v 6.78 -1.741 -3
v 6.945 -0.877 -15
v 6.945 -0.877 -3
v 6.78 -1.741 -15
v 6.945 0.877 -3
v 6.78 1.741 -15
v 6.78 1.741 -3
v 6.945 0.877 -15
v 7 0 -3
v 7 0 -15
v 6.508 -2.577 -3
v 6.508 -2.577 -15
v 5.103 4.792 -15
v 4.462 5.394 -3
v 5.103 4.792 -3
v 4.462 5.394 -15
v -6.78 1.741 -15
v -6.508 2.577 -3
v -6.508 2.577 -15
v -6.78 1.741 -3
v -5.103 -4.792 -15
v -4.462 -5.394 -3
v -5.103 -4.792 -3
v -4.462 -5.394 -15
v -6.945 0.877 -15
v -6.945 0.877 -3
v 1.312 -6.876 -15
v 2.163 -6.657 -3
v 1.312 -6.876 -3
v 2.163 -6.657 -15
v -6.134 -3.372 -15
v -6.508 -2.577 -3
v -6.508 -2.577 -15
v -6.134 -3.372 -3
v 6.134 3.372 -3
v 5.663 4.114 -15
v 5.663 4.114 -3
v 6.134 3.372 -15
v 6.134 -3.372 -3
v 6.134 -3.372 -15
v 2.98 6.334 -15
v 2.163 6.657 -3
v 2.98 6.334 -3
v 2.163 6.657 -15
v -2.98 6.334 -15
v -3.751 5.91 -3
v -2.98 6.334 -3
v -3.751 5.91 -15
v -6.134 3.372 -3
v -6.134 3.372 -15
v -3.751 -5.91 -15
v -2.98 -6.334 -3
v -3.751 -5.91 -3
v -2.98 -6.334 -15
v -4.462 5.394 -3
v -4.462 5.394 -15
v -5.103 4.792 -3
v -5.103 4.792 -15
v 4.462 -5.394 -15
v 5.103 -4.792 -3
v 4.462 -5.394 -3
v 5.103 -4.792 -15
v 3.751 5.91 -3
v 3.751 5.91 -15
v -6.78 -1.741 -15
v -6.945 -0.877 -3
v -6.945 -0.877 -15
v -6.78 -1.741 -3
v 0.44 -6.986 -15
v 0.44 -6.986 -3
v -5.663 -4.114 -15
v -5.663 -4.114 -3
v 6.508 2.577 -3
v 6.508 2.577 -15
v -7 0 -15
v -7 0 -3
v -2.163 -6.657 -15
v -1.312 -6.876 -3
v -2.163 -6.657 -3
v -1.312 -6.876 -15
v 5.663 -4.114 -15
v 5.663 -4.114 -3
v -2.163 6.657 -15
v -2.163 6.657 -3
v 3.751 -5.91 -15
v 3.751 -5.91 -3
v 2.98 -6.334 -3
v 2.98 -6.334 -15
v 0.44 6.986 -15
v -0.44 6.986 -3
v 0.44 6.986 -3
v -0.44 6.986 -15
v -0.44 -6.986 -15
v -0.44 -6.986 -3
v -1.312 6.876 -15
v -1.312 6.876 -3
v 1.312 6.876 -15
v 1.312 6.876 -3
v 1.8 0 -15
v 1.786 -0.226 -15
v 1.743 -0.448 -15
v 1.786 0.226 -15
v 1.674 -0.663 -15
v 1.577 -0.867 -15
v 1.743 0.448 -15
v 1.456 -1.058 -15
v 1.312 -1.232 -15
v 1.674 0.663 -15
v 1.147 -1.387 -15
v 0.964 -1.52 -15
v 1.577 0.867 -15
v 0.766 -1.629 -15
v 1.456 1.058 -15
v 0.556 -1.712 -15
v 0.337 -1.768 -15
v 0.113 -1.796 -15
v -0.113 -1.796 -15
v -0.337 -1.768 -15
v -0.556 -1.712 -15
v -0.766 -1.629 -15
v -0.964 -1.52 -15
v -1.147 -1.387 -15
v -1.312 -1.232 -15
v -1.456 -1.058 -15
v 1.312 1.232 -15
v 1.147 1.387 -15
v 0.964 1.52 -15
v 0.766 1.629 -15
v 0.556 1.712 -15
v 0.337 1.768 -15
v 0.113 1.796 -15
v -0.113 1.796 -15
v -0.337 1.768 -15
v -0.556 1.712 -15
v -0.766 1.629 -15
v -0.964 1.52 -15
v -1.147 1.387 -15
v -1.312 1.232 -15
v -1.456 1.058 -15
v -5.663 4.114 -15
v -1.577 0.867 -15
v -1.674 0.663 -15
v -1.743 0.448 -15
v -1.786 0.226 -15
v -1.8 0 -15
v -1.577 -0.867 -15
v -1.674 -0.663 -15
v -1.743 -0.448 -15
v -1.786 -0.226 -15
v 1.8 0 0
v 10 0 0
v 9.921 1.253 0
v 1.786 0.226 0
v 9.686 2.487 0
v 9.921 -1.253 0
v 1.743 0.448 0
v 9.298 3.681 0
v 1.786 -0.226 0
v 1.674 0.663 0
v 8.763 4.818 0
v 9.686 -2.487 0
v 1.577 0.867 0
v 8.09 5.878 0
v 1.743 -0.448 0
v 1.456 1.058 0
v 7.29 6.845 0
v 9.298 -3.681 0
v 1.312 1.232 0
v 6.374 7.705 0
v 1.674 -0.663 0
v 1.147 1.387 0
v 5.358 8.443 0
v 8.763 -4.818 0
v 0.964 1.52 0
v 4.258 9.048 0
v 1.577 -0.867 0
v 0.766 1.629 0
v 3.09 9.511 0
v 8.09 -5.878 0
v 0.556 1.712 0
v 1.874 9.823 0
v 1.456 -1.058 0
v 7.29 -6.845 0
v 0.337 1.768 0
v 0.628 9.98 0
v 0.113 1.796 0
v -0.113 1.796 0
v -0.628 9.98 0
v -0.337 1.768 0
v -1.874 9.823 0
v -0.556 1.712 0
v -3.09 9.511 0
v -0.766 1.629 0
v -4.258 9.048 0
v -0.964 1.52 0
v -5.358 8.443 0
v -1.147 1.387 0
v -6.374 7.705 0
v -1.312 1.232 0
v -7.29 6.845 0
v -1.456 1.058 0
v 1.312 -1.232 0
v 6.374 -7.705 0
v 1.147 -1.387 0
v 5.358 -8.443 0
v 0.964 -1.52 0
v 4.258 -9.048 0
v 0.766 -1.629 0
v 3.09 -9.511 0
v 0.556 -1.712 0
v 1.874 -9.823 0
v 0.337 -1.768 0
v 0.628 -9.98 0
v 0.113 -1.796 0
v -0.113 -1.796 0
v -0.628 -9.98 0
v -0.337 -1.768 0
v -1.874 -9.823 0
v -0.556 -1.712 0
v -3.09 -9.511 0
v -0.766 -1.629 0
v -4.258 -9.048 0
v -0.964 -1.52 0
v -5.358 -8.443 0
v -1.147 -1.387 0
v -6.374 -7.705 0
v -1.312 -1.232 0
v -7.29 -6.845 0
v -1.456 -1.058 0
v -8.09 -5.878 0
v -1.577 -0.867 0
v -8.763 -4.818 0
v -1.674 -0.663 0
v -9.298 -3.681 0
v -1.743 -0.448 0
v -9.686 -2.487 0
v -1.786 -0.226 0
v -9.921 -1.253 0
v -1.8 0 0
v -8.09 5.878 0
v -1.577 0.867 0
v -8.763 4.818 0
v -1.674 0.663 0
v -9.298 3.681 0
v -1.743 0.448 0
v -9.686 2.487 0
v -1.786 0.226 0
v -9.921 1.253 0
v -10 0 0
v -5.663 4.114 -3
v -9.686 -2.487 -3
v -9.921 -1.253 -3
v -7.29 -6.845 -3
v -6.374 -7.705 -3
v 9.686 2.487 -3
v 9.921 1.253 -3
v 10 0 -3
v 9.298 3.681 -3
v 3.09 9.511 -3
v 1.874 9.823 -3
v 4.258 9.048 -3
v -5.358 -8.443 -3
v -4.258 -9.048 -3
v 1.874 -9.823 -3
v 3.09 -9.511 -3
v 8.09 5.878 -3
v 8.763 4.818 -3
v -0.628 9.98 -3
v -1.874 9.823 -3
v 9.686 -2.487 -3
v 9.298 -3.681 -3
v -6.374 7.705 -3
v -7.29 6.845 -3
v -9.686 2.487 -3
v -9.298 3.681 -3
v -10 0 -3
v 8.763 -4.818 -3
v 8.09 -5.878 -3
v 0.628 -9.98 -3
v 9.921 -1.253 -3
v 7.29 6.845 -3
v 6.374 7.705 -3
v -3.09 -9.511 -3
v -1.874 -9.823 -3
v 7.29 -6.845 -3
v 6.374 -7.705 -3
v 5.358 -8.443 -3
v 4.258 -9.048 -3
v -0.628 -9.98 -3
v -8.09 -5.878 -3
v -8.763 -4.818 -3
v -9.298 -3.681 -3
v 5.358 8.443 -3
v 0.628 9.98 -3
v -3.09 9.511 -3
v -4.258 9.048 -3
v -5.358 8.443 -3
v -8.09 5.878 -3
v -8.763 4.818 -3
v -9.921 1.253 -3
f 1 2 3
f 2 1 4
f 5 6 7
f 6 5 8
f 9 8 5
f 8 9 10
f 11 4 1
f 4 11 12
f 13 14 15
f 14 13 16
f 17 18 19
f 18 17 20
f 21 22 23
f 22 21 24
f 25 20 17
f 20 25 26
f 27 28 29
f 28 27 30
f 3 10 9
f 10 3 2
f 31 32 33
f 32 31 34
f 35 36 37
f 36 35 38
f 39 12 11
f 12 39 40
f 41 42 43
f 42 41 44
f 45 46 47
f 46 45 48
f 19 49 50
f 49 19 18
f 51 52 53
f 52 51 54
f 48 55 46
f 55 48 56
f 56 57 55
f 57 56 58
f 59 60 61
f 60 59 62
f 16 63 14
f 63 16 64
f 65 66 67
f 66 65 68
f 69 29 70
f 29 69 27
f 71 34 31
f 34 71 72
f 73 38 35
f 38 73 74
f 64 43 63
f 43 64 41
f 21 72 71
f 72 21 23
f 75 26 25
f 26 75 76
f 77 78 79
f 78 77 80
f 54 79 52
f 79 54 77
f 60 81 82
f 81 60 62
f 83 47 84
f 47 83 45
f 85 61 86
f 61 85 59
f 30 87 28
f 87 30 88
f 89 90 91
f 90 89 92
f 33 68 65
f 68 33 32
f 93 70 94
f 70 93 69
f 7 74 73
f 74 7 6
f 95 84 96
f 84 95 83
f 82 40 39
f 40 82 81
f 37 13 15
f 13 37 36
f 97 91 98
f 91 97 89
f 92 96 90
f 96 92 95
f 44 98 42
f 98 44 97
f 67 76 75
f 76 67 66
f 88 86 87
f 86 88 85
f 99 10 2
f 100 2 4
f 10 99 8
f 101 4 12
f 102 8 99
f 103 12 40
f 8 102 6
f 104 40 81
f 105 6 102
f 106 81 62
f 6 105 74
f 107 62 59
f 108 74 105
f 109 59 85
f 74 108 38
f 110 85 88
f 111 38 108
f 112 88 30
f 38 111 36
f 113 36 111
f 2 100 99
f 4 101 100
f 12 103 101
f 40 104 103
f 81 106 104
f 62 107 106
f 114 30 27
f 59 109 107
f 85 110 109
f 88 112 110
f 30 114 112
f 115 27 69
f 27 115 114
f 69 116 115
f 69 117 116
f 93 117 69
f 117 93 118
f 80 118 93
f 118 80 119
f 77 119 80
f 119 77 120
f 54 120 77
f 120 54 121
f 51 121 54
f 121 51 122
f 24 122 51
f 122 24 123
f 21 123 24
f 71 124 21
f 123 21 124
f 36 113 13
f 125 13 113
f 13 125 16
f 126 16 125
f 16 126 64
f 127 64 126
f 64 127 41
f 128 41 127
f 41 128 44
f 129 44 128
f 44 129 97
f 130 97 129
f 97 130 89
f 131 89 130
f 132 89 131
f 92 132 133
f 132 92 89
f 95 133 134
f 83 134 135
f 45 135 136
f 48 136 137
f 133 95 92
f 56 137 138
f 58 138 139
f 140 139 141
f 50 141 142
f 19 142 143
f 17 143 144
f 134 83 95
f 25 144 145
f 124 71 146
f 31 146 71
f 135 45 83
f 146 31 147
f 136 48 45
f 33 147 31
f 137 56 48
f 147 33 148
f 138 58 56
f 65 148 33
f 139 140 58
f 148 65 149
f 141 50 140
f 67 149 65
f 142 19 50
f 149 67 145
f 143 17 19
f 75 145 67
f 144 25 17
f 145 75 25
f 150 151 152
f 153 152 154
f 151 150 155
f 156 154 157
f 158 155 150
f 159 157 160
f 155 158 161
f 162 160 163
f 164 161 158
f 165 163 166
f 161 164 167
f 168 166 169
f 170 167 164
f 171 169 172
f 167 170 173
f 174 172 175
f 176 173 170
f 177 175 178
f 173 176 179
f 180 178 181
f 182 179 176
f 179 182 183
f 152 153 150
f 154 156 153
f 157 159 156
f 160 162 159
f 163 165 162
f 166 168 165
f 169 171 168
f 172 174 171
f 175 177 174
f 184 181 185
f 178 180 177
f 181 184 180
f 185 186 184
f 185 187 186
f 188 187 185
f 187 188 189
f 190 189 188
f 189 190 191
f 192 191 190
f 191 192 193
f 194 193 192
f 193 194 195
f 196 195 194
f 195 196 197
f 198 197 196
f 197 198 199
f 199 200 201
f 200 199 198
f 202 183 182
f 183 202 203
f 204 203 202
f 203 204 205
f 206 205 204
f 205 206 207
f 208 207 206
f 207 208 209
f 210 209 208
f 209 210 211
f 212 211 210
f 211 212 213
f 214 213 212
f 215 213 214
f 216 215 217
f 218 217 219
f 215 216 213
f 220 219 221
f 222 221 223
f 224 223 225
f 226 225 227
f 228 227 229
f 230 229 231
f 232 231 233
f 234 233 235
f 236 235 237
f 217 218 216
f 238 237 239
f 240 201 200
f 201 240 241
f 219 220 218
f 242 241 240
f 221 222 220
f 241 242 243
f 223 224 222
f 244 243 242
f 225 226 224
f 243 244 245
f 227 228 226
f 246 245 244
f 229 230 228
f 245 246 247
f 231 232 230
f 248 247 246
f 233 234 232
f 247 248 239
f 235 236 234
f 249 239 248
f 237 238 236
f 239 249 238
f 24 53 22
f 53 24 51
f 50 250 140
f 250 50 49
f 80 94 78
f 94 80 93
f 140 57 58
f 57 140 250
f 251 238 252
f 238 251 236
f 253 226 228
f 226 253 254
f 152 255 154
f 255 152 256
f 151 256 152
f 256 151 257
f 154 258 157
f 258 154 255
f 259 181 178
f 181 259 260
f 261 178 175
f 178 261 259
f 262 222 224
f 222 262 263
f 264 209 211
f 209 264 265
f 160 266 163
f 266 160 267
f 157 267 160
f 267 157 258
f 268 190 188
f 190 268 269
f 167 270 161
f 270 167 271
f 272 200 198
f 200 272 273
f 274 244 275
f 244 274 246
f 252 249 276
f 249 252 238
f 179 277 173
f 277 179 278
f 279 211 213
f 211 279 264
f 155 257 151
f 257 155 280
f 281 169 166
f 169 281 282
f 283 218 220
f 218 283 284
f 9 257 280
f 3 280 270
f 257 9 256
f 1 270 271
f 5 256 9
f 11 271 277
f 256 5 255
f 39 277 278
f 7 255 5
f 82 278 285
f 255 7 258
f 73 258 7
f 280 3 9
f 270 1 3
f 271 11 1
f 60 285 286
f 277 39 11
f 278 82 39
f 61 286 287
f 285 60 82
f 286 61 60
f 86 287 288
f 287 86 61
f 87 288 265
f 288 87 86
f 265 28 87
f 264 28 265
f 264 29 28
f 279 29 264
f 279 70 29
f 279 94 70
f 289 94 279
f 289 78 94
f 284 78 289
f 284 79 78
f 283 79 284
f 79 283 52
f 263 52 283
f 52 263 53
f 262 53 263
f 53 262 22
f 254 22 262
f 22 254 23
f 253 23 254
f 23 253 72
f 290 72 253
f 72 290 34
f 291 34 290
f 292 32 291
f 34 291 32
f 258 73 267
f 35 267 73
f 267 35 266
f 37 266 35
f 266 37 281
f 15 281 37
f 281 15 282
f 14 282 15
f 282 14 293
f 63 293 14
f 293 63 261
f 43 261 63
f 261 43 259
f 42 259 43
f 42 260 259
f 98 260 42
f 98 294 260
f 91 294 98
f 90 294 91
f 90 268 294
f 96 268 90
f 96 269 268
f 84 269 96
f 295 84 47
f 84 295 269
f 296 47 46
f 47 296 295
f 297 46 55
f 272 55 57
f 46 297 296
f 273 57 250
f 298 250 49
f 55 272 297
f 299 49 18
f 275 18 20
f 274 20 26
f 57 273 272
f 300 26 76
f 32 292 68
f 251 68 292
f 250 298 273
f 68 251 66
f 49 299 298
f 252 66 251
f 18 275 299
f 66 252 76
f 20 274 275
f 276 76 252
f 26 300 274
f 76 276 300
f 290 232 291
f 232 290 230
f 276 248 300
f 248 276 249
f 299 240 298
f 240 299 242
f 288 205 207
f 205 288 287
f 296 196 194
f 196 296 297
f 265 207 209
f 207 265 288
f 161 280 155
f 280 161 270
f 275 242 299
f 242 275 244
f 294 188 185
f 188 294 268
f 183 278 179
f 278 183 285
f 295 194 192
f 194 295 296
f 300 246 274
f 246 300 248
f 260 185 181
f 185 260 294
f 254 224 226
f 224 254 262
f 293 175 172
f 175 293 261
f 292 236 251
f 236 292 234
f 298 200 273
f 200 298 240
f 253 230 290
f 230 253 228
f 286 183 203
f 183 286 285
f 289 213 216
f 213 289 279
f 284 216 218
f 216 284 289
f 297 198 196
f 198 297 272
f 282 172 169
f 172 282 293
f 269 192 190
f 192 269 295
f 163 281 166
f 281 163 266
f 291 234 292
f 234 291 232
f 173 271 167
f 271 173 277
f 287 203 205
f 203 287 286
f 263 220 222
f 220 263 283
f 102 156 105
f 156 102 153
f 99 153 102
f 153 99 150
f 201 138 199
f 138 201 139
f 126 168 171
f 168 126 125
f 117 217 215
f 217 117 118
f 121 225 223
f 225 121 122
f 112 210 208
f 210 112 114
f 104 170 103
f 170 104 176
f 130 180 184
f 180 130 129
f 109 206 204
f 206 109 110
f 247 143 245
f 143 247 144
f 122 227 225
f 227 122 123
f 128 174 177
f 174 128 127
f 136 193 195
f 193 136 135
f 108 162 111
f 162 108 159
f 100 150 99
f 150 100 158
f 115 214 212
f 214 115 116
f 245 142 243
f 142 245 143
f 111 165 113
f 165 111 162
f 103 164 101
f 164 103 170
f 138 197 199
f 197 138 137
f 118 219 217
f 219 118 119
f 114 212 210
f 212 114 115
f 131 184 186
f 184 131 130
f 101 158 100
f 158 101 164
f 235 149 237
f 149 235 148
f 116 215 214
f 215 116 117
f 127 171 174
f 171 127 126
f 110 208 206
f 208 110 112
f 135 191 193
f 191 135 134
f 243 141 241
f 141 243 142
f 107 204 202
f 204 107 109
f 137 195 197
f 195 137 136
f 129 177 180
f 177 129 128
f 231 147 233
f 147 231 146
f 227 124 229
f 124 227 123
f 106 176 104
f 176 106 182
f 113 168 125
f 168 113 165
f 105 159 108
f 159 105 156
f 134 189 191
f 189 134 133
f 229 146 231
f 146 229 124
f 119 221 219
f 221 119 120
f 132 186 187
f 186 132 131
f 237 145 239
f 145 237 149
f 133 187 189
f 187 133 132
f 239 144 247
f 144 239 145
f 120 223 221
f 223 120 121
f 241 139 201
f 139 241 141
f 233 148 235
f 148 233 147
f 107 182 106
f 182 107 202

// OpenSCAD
$fn = 50;


difference() {
	union() {
		translate(v = [0, 0, -15.0000000000]) {
			cylinder(h = 15, r = 7.0000000000);
		}
		translate(v = [0, 0, -3.0000000000]) {
			cylinder(h = 3, r = 10.0000000000);
		}
	}
	union() {
		#translate(v = [0, 0, -15]) {
			cylinder(h = 15, r = 1.8000000000);
		}
	}
}
